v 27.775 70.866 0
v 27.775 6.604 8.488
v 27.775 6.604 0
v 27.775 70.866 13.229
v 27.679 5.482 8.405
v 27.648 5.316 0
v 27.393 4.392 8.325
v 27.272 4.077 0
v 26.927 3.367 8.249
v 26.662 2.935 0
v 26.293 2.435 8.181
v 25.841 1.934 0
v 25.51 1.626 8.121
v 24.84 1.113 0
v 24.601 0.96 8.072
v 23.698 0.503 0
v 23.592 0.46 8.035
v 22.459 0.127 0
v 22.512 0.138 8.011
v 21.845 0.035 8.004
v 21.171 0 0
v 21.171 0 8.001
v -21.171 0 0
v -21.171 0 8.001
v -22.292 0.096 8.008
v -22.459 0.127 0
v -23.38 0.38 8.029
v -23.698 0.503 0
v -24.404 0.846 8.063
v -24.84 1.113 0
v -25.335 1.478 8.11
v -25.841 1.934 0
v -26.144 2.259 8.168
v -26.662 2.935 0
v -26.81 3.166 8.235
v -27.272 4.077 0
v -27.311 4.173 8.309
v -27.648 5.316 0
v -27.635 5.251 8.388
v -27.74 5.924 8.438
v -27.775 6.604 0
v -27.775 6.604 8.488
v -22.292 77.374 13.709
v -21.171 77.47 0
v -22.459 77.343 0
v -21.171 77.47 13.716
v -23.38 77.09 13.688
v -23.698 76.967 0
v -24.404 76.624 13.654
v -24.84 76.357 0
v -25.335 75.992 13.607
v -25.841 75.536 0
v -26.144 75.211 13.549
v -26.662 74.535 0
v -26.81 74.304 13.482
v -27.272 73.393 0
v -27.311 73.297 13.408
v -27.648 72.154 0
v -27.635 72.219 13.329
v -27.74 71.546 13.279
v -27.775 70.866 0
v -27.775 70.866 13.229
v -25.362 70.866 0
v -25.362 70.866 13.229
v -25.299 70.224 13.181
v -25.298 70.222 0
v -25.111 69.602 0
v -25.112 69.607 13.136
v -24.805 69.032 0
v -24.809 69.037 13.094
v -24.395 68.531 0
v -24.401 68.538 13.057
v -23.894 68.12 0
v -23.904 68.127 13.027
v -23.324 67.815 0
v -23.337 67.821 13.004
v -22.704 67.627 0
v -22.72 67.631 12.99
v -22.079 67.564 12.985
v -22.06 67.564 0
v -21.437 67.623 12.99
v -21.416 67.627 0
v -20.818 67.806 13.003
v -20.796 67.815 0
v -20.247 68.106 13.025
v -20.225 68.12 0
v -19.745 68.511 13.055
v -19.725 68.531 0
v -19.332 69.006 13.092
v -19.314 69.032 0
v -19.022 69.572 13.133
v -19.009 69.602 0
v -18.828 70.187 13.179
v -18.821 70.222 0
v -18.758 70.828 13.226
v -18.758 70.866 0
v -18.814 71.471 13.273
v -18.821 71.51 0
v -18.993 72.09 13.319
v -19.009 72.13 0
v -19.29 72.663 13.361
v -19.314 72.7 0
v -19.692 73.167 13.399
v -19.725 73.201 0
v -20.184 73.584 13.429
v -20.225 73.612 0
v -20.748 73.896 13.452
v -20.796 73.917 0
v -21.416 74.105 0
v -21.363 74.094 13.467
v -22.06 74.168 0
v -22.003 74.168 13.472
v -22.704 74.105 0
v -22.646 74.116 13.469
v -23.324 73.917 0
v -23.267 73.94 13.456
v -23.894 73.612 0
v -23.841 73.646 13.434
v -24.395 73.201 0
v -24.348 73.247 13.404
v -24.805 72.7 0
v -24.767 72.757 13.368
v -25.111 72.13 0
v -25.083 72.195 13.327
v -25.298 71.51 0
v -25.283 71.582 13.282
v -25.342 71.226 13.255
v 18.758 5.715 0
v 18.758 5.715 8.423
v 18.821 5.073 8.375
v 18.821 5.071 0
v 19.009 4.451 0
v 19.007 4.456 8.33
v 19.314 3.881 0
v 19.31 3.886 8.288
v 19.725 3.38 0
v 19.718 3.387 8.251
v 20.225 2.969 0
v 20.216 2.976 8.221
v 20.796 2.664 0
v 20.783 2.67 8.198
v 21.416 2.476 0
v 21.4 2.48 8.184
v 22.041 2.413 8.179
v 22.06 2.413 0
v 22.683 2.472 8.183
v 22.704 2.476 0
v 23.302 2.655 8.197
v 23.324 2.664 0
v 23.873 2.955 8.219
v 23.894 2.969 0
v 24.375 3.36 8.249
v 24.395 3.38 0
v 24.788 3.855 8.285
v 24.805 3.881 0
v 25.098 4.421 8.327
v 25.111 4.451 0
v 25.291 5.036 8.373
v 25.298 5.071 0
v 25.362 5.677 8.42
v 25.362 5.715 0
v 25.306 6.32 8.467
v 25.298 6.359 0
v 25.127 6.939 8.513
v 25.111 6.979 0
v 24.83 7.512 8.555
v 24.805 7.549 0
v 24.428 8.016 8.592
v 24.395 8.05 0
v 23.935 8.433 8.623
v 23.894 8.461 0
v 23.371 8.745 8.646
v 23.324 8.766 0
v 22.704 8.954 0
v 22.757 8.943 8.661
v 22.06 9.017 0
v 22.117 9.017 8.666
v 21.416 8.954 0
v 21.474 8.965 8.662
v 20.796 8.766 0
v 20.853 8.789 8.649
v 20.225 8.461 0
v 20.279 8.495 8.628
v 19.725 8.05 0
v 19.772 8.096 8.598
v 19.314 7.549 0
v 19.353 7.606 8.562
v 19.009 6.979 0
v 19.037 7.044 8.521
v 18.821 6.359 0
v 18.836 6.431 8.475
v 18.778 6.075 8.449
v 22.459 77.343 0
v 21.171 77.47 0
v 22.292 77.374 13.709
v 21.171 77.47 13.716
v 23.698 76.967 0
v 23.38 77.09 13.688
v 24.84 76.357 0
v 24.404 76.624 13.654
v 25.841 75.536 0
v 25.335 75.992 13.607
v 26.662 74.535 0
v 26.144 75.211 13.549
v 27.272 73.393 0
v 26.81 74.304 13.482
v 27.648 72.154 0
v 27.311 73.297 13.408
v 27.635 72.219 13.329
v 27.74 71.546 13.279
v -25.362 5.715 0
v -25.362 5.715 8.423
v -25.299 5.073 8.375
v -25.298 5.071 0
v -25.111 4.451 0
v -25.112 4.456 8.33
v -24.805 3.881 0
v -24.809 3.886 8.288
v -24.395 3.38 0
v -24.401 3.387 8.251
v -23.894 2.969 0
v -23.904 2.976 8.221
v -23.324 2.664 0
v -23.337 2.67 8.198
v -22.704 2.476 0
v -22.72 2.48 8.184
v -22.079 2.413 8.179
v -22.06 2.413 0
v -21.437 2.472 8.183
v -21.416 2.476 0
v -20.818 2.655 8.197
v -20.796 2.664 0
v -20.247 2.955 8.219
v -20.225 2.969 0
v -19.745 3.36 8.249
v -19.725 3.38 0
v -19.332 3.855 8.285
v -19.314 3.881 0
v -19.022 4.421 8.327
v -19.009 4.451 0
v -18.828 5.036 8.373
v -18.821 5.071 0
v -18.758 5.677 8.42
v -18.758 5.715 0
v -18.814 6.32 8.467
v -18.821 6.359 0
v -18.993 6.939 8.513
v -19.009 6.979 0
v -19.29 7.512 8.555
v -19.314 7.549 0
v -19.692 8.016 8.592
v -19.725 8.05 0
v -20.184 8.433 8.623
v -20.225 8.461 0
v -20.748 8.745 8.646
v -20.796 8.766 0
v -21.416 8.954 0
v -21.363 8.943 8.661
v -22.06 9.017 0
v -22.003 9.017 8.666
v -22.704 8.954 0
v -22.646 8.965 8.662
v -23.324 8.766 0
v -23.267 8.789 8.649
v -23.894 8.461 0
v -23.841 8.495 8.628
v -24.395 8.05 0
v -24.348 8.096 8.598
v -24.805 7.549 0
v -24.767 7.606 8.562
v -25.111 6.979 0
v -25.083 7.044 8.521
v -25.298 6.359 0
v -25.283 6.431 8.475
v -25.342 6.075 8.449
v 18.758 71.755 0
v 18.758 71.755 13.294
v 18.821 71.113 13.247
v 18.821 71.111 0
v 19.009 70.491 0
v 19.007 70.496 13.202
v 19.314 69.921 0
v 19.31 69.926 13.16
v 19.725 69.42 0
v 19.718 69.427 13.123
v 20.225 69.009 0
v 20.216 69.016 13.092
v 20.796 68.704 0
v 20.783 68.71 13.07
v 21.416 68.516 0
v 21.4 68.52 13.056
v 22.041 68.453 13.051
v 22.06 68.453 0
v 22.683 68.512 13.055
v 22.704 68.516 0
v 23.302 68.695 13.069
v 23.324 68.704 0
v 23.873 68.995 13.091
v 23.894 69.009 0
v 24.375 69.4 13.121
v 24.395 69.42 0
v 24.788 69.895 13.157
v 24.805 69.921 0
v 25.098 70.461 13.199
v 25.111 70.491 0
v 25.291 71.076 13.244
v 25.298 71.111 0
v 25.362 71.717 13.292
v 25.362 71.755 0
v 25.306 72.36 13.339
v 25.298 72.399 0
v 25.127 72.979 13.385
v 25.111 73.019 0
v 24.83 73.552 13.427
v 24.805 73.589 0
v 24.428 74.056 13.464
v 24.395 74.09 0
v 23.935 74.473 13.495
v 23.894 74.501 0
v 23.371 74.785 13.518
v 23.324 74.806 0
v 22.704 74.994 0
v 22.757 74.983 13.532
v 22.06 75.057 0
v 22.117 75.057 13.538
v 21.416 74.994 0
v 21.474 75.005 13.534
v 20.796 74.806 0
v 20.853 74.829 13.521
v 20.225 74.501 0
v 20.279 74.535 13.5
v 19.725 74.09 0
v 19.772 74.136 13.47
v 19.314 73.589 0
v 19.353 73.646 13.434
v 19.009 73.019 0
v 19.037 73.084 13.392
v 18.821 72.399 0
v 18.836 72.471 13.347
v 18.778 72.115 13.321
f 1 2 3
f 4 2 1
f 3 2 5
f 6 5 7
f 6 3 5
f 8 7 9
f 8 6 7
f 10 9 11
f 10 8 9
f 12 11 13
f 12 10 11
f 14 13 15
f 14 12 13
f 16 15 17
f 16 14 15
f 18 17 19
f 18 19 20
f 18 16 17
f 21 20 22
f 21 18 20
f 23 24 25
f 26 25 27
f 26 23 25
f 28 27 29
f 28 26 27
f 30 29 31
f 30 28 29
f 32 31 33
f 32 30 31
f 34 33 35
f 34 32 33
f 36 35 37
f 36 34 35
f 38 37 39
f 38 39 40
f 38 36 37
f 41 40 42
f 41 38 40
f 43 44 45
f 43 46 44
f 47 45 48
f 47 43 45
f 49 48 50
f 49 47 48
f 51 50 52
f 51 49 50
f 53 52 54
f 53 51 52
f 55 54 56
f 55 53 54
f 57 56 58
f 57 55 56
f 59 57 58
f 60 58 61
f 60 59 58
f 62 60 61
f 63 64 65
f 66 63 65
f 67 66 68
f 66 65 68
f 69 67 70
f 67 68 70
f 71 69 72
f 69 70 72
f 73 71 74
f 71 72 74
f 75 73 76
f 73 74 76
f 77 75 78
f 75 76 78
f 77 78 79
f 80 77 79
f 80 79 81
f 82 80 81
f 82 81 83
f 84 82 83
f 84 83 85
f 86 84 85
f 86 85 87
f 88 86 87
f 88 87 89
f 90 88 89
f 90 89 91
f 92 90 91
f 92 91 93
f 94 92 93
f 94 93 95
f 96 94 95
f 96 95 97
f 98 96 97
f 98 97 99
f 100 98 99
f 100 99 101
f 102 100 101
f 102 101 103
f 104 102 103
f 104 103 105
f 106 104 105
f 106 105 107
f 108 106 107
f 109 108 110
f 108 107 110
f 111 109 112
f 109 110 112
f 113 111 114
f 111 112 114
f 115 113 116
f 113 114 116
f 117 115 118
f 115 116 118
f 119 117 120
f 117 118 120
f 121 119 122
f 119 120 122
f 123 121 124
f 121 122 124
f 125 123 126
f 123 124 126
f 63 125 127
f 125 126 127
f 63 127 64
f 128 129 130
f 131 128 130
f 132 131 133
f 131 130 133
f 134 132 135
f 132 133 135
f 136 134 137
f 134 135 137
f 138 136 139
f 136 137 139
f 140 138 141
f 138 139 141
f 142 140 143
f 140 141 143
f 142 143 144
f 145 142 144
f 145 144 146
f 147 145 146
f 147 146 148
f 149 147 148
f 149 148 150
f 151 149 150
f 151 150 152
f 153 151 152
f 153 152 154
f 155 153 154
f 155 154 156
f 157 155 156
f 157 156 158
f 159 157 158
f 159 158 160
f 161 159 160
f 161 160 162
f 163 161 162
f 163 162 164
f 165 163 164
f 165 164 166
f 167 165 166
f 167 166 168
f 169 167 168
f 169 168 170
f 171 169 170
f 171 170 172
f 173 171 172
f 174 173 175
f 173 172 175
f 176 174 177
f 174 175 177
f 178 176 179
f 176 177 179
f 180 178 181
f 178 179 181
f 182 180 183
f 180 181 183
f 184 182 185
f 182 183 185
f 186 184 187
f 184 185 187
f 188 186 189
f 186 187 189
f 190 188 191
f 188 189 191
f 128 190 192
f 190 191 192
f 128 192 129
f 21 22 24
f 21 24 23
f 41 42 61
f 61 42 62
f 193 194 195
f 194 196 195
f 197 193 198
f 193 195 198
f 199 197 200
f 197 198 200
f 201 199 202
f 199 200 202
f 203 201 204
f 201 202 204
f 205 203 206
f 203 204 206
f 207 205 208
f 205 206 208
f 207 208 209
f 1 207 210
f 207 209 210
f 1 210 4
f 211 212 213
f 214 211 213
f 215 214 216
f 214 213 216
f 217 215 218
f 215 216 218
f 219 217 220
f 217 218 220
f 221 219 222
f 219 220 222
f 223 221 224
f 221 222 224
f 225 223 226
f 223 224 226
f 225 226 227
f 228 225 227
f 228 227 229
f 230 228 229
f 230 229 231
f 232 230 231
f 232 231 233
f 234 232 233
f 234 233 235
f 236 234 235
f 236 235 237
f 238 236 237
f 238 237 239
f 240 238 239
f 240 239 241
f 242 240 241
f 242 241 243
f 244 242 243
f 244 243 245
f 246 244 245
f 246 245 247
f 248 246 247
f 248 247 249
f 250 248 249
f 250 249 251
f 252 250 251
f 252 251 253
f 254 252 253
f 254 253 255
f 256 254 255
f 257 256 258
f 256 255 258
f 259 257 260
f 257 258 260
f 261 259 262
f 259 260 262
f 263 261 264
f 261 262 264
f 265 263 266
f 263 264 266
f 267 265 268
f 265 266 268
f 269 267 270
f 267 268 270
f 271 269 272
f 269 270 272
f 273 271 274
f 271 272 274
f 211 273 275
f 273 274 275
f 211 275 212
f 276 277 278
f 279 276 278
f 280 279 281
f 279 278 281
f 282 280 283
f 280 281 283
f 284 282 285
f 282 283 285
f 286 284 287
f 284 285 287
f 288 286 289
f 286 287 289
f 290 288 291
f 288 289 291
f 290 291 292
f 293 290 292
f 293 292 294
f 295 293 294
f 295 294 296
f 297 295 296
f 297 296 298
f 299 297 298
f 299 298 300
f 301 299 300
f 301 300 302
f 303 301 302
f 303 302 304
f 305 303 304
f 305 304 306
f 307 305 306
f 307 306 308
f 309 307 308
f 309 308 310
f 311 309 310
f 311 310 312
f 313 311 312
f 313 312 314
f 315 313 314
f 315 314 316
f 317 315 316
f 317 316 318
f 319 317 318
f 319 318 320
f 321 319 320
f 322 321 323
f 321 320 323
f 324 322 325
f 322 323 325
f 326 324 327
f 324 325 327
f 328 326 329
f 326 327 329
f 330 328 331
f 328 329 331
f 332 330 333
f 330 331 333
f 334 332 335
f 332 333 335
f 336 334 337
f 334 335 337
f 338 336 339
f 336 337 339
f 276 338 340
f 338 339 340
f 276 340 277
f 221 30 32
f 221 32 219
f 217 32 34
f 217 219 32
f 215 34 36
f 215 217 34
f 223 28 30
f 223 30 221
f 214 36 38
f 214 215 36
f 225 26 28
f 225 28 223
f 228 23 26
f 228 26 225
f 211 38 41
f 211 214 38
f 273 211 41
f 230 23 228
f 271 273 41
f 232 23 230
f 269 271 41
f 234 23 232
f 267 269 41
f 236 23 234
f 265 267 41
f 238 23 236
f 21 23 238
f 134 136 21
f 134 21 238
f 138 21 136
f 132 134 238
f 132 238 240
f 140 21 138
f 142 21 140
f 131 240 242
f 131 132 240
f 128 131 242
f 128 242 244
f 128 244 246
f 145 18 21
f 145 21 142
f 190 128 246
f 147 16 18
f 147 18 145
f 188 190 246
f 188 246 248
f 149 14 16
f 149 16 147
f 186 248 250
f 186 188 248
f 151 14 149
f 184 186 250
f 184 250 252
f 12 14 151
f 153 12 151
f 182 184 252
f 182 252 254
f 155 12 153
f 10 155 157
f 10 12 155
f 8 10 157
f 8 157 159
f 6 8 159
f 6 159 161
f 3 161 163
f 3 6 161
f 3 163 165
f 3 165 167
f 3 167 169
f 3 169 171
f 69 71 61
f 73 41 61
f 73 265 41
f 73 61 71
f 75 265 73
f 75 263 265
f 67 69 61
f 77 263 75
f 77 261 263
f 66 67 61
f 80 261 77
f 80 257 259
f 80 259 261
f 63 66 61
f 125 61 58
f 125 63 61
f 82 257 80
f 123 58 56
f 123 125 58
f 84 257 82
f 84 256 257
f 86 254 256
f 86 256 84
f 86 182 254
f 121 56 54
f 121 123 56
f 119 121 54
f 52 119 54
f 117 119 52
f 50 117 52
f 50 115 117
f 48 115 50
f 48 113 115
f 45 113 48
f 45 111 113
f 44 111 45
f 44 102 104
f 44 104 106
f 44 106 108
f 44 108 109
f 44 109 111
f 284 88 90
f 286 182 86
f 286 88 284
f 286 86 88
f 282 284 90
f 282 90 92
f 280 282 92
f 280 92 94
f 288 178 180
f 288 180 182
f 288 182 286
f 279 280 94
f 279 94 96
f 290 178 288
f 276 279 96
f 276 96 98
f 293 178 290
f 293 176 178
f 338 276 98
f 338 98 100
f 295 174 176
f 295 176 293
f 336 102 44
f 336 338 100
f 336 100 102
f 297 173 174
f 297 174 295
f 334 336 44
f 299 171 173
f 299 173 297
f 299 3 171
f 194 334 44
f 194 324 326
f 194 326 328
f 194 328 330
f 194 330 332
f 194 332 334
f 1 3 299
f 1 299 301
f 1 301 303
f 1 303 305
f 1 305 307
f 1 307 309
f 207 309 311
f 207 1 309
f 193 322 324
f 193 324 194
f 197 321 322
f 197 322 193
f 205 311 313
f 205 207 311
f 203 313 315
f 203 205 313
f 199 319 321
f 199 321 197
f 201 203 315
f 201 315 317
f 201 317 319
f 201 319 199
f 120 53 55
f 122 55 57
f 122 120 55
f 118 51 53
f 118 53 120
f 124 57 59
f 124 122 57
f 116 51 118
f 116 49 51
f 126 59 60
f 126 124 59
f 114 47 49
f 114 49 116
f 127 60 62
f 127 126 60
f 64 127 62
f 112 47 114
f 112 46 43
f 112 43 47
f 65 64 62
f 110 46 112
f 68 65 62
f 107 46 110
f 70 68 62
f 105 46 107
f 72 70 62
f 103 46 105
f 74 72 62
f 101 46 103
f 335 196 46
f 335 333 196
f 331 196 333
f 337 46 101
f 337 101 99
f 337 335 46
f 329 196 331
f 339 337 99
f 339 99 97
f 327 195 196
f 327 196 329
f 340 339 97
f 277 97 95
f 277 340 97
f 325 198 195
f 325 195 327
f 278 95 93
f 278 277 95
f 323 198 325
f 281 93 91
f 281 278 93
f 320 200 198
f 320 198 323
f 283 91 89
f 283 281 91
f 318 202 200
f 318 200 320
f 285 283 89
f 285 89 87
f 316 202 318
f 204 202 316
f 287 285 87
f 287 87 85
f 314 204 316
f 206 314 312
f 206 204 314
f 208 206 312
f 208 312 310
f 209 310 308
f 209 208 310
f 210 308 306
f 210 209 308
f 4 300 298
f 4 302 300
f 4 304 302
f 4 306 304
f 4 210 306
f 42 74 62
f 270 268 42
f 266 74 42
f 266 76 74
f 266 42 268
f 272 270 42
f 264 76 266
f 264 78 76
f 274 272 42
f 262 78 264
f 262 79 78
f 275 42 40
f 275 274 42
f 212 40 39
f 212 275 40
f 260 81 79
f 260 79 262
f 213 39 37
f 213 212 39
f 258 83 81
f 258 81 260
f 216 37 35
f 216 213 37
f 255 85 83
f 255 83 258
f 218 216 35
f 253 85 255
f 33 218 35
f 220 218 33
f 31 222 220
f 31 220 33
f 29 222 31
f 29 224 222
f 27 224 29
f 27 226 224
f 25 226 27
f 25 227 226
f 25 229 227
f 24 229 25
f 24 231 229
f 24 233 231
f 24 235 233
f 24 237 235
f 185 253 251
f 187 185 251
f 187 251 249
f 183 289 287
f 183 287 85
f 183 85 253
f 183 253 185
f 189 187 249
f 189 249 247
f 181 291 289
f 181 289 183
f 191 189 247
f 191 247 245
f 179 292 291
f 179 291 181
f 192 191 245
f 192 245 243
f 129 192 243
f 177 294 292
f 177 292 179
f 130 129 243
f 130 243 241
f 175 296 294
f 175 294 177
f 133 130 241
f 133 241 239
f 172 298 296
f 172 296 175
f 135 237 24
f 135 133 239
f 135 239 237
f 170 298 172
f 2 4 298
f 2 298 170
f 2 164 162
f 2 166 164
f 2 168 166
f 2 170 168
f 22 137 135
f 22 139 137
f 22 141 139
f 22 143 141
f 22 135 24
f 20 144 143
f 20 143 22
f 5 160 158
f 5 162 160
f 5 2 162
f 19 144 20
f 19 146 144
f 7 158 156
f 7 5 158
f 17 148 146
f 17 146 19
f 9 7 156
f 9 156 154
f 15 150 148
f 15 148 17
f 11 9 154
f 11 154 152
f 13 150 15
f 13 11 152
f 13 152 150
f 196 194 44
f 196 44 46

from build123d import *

# Parameters (mm, degrees)
F1_DEPTH = 27.7749
F2_R     = 6.604
F4_D     = 6.604


with BuildPart() as f1:
    # F0 (on Right) → F1 (new body, symmetric)
    with BuildSketch(Plane.YZ):
        Polygon((77.47, 13.716), (0, 8.001), (0, 0), (77.47, 0), align=None)
    extrude(amount=F1_DEPTH, both=True)

    # F2
    f2_edges = [f1.edges().sort_by_distance(p)[0] for p in [
        (27.7749, 0, 4.0005),
        (27.7749, 77.47, 6.858),
        (-27.7749, 77.47, 6.858),
        (-27.7749, 0, 4.0005),
    ]]
    fillet(f2_edges, radius=F2_R)

    # F4 (through all)
    with Locations(Plane(origin=(0, 0, 0), x_dir=(1, 0, 0), z_dir=(0, 0, -1))):
        with Locations((22.0599, -5.715), (-22.0599, -5.715), (22.0599, -71.755), (-22.0599, -70.866)):
            Hole(F4_D / 2)


solid = f1.part
